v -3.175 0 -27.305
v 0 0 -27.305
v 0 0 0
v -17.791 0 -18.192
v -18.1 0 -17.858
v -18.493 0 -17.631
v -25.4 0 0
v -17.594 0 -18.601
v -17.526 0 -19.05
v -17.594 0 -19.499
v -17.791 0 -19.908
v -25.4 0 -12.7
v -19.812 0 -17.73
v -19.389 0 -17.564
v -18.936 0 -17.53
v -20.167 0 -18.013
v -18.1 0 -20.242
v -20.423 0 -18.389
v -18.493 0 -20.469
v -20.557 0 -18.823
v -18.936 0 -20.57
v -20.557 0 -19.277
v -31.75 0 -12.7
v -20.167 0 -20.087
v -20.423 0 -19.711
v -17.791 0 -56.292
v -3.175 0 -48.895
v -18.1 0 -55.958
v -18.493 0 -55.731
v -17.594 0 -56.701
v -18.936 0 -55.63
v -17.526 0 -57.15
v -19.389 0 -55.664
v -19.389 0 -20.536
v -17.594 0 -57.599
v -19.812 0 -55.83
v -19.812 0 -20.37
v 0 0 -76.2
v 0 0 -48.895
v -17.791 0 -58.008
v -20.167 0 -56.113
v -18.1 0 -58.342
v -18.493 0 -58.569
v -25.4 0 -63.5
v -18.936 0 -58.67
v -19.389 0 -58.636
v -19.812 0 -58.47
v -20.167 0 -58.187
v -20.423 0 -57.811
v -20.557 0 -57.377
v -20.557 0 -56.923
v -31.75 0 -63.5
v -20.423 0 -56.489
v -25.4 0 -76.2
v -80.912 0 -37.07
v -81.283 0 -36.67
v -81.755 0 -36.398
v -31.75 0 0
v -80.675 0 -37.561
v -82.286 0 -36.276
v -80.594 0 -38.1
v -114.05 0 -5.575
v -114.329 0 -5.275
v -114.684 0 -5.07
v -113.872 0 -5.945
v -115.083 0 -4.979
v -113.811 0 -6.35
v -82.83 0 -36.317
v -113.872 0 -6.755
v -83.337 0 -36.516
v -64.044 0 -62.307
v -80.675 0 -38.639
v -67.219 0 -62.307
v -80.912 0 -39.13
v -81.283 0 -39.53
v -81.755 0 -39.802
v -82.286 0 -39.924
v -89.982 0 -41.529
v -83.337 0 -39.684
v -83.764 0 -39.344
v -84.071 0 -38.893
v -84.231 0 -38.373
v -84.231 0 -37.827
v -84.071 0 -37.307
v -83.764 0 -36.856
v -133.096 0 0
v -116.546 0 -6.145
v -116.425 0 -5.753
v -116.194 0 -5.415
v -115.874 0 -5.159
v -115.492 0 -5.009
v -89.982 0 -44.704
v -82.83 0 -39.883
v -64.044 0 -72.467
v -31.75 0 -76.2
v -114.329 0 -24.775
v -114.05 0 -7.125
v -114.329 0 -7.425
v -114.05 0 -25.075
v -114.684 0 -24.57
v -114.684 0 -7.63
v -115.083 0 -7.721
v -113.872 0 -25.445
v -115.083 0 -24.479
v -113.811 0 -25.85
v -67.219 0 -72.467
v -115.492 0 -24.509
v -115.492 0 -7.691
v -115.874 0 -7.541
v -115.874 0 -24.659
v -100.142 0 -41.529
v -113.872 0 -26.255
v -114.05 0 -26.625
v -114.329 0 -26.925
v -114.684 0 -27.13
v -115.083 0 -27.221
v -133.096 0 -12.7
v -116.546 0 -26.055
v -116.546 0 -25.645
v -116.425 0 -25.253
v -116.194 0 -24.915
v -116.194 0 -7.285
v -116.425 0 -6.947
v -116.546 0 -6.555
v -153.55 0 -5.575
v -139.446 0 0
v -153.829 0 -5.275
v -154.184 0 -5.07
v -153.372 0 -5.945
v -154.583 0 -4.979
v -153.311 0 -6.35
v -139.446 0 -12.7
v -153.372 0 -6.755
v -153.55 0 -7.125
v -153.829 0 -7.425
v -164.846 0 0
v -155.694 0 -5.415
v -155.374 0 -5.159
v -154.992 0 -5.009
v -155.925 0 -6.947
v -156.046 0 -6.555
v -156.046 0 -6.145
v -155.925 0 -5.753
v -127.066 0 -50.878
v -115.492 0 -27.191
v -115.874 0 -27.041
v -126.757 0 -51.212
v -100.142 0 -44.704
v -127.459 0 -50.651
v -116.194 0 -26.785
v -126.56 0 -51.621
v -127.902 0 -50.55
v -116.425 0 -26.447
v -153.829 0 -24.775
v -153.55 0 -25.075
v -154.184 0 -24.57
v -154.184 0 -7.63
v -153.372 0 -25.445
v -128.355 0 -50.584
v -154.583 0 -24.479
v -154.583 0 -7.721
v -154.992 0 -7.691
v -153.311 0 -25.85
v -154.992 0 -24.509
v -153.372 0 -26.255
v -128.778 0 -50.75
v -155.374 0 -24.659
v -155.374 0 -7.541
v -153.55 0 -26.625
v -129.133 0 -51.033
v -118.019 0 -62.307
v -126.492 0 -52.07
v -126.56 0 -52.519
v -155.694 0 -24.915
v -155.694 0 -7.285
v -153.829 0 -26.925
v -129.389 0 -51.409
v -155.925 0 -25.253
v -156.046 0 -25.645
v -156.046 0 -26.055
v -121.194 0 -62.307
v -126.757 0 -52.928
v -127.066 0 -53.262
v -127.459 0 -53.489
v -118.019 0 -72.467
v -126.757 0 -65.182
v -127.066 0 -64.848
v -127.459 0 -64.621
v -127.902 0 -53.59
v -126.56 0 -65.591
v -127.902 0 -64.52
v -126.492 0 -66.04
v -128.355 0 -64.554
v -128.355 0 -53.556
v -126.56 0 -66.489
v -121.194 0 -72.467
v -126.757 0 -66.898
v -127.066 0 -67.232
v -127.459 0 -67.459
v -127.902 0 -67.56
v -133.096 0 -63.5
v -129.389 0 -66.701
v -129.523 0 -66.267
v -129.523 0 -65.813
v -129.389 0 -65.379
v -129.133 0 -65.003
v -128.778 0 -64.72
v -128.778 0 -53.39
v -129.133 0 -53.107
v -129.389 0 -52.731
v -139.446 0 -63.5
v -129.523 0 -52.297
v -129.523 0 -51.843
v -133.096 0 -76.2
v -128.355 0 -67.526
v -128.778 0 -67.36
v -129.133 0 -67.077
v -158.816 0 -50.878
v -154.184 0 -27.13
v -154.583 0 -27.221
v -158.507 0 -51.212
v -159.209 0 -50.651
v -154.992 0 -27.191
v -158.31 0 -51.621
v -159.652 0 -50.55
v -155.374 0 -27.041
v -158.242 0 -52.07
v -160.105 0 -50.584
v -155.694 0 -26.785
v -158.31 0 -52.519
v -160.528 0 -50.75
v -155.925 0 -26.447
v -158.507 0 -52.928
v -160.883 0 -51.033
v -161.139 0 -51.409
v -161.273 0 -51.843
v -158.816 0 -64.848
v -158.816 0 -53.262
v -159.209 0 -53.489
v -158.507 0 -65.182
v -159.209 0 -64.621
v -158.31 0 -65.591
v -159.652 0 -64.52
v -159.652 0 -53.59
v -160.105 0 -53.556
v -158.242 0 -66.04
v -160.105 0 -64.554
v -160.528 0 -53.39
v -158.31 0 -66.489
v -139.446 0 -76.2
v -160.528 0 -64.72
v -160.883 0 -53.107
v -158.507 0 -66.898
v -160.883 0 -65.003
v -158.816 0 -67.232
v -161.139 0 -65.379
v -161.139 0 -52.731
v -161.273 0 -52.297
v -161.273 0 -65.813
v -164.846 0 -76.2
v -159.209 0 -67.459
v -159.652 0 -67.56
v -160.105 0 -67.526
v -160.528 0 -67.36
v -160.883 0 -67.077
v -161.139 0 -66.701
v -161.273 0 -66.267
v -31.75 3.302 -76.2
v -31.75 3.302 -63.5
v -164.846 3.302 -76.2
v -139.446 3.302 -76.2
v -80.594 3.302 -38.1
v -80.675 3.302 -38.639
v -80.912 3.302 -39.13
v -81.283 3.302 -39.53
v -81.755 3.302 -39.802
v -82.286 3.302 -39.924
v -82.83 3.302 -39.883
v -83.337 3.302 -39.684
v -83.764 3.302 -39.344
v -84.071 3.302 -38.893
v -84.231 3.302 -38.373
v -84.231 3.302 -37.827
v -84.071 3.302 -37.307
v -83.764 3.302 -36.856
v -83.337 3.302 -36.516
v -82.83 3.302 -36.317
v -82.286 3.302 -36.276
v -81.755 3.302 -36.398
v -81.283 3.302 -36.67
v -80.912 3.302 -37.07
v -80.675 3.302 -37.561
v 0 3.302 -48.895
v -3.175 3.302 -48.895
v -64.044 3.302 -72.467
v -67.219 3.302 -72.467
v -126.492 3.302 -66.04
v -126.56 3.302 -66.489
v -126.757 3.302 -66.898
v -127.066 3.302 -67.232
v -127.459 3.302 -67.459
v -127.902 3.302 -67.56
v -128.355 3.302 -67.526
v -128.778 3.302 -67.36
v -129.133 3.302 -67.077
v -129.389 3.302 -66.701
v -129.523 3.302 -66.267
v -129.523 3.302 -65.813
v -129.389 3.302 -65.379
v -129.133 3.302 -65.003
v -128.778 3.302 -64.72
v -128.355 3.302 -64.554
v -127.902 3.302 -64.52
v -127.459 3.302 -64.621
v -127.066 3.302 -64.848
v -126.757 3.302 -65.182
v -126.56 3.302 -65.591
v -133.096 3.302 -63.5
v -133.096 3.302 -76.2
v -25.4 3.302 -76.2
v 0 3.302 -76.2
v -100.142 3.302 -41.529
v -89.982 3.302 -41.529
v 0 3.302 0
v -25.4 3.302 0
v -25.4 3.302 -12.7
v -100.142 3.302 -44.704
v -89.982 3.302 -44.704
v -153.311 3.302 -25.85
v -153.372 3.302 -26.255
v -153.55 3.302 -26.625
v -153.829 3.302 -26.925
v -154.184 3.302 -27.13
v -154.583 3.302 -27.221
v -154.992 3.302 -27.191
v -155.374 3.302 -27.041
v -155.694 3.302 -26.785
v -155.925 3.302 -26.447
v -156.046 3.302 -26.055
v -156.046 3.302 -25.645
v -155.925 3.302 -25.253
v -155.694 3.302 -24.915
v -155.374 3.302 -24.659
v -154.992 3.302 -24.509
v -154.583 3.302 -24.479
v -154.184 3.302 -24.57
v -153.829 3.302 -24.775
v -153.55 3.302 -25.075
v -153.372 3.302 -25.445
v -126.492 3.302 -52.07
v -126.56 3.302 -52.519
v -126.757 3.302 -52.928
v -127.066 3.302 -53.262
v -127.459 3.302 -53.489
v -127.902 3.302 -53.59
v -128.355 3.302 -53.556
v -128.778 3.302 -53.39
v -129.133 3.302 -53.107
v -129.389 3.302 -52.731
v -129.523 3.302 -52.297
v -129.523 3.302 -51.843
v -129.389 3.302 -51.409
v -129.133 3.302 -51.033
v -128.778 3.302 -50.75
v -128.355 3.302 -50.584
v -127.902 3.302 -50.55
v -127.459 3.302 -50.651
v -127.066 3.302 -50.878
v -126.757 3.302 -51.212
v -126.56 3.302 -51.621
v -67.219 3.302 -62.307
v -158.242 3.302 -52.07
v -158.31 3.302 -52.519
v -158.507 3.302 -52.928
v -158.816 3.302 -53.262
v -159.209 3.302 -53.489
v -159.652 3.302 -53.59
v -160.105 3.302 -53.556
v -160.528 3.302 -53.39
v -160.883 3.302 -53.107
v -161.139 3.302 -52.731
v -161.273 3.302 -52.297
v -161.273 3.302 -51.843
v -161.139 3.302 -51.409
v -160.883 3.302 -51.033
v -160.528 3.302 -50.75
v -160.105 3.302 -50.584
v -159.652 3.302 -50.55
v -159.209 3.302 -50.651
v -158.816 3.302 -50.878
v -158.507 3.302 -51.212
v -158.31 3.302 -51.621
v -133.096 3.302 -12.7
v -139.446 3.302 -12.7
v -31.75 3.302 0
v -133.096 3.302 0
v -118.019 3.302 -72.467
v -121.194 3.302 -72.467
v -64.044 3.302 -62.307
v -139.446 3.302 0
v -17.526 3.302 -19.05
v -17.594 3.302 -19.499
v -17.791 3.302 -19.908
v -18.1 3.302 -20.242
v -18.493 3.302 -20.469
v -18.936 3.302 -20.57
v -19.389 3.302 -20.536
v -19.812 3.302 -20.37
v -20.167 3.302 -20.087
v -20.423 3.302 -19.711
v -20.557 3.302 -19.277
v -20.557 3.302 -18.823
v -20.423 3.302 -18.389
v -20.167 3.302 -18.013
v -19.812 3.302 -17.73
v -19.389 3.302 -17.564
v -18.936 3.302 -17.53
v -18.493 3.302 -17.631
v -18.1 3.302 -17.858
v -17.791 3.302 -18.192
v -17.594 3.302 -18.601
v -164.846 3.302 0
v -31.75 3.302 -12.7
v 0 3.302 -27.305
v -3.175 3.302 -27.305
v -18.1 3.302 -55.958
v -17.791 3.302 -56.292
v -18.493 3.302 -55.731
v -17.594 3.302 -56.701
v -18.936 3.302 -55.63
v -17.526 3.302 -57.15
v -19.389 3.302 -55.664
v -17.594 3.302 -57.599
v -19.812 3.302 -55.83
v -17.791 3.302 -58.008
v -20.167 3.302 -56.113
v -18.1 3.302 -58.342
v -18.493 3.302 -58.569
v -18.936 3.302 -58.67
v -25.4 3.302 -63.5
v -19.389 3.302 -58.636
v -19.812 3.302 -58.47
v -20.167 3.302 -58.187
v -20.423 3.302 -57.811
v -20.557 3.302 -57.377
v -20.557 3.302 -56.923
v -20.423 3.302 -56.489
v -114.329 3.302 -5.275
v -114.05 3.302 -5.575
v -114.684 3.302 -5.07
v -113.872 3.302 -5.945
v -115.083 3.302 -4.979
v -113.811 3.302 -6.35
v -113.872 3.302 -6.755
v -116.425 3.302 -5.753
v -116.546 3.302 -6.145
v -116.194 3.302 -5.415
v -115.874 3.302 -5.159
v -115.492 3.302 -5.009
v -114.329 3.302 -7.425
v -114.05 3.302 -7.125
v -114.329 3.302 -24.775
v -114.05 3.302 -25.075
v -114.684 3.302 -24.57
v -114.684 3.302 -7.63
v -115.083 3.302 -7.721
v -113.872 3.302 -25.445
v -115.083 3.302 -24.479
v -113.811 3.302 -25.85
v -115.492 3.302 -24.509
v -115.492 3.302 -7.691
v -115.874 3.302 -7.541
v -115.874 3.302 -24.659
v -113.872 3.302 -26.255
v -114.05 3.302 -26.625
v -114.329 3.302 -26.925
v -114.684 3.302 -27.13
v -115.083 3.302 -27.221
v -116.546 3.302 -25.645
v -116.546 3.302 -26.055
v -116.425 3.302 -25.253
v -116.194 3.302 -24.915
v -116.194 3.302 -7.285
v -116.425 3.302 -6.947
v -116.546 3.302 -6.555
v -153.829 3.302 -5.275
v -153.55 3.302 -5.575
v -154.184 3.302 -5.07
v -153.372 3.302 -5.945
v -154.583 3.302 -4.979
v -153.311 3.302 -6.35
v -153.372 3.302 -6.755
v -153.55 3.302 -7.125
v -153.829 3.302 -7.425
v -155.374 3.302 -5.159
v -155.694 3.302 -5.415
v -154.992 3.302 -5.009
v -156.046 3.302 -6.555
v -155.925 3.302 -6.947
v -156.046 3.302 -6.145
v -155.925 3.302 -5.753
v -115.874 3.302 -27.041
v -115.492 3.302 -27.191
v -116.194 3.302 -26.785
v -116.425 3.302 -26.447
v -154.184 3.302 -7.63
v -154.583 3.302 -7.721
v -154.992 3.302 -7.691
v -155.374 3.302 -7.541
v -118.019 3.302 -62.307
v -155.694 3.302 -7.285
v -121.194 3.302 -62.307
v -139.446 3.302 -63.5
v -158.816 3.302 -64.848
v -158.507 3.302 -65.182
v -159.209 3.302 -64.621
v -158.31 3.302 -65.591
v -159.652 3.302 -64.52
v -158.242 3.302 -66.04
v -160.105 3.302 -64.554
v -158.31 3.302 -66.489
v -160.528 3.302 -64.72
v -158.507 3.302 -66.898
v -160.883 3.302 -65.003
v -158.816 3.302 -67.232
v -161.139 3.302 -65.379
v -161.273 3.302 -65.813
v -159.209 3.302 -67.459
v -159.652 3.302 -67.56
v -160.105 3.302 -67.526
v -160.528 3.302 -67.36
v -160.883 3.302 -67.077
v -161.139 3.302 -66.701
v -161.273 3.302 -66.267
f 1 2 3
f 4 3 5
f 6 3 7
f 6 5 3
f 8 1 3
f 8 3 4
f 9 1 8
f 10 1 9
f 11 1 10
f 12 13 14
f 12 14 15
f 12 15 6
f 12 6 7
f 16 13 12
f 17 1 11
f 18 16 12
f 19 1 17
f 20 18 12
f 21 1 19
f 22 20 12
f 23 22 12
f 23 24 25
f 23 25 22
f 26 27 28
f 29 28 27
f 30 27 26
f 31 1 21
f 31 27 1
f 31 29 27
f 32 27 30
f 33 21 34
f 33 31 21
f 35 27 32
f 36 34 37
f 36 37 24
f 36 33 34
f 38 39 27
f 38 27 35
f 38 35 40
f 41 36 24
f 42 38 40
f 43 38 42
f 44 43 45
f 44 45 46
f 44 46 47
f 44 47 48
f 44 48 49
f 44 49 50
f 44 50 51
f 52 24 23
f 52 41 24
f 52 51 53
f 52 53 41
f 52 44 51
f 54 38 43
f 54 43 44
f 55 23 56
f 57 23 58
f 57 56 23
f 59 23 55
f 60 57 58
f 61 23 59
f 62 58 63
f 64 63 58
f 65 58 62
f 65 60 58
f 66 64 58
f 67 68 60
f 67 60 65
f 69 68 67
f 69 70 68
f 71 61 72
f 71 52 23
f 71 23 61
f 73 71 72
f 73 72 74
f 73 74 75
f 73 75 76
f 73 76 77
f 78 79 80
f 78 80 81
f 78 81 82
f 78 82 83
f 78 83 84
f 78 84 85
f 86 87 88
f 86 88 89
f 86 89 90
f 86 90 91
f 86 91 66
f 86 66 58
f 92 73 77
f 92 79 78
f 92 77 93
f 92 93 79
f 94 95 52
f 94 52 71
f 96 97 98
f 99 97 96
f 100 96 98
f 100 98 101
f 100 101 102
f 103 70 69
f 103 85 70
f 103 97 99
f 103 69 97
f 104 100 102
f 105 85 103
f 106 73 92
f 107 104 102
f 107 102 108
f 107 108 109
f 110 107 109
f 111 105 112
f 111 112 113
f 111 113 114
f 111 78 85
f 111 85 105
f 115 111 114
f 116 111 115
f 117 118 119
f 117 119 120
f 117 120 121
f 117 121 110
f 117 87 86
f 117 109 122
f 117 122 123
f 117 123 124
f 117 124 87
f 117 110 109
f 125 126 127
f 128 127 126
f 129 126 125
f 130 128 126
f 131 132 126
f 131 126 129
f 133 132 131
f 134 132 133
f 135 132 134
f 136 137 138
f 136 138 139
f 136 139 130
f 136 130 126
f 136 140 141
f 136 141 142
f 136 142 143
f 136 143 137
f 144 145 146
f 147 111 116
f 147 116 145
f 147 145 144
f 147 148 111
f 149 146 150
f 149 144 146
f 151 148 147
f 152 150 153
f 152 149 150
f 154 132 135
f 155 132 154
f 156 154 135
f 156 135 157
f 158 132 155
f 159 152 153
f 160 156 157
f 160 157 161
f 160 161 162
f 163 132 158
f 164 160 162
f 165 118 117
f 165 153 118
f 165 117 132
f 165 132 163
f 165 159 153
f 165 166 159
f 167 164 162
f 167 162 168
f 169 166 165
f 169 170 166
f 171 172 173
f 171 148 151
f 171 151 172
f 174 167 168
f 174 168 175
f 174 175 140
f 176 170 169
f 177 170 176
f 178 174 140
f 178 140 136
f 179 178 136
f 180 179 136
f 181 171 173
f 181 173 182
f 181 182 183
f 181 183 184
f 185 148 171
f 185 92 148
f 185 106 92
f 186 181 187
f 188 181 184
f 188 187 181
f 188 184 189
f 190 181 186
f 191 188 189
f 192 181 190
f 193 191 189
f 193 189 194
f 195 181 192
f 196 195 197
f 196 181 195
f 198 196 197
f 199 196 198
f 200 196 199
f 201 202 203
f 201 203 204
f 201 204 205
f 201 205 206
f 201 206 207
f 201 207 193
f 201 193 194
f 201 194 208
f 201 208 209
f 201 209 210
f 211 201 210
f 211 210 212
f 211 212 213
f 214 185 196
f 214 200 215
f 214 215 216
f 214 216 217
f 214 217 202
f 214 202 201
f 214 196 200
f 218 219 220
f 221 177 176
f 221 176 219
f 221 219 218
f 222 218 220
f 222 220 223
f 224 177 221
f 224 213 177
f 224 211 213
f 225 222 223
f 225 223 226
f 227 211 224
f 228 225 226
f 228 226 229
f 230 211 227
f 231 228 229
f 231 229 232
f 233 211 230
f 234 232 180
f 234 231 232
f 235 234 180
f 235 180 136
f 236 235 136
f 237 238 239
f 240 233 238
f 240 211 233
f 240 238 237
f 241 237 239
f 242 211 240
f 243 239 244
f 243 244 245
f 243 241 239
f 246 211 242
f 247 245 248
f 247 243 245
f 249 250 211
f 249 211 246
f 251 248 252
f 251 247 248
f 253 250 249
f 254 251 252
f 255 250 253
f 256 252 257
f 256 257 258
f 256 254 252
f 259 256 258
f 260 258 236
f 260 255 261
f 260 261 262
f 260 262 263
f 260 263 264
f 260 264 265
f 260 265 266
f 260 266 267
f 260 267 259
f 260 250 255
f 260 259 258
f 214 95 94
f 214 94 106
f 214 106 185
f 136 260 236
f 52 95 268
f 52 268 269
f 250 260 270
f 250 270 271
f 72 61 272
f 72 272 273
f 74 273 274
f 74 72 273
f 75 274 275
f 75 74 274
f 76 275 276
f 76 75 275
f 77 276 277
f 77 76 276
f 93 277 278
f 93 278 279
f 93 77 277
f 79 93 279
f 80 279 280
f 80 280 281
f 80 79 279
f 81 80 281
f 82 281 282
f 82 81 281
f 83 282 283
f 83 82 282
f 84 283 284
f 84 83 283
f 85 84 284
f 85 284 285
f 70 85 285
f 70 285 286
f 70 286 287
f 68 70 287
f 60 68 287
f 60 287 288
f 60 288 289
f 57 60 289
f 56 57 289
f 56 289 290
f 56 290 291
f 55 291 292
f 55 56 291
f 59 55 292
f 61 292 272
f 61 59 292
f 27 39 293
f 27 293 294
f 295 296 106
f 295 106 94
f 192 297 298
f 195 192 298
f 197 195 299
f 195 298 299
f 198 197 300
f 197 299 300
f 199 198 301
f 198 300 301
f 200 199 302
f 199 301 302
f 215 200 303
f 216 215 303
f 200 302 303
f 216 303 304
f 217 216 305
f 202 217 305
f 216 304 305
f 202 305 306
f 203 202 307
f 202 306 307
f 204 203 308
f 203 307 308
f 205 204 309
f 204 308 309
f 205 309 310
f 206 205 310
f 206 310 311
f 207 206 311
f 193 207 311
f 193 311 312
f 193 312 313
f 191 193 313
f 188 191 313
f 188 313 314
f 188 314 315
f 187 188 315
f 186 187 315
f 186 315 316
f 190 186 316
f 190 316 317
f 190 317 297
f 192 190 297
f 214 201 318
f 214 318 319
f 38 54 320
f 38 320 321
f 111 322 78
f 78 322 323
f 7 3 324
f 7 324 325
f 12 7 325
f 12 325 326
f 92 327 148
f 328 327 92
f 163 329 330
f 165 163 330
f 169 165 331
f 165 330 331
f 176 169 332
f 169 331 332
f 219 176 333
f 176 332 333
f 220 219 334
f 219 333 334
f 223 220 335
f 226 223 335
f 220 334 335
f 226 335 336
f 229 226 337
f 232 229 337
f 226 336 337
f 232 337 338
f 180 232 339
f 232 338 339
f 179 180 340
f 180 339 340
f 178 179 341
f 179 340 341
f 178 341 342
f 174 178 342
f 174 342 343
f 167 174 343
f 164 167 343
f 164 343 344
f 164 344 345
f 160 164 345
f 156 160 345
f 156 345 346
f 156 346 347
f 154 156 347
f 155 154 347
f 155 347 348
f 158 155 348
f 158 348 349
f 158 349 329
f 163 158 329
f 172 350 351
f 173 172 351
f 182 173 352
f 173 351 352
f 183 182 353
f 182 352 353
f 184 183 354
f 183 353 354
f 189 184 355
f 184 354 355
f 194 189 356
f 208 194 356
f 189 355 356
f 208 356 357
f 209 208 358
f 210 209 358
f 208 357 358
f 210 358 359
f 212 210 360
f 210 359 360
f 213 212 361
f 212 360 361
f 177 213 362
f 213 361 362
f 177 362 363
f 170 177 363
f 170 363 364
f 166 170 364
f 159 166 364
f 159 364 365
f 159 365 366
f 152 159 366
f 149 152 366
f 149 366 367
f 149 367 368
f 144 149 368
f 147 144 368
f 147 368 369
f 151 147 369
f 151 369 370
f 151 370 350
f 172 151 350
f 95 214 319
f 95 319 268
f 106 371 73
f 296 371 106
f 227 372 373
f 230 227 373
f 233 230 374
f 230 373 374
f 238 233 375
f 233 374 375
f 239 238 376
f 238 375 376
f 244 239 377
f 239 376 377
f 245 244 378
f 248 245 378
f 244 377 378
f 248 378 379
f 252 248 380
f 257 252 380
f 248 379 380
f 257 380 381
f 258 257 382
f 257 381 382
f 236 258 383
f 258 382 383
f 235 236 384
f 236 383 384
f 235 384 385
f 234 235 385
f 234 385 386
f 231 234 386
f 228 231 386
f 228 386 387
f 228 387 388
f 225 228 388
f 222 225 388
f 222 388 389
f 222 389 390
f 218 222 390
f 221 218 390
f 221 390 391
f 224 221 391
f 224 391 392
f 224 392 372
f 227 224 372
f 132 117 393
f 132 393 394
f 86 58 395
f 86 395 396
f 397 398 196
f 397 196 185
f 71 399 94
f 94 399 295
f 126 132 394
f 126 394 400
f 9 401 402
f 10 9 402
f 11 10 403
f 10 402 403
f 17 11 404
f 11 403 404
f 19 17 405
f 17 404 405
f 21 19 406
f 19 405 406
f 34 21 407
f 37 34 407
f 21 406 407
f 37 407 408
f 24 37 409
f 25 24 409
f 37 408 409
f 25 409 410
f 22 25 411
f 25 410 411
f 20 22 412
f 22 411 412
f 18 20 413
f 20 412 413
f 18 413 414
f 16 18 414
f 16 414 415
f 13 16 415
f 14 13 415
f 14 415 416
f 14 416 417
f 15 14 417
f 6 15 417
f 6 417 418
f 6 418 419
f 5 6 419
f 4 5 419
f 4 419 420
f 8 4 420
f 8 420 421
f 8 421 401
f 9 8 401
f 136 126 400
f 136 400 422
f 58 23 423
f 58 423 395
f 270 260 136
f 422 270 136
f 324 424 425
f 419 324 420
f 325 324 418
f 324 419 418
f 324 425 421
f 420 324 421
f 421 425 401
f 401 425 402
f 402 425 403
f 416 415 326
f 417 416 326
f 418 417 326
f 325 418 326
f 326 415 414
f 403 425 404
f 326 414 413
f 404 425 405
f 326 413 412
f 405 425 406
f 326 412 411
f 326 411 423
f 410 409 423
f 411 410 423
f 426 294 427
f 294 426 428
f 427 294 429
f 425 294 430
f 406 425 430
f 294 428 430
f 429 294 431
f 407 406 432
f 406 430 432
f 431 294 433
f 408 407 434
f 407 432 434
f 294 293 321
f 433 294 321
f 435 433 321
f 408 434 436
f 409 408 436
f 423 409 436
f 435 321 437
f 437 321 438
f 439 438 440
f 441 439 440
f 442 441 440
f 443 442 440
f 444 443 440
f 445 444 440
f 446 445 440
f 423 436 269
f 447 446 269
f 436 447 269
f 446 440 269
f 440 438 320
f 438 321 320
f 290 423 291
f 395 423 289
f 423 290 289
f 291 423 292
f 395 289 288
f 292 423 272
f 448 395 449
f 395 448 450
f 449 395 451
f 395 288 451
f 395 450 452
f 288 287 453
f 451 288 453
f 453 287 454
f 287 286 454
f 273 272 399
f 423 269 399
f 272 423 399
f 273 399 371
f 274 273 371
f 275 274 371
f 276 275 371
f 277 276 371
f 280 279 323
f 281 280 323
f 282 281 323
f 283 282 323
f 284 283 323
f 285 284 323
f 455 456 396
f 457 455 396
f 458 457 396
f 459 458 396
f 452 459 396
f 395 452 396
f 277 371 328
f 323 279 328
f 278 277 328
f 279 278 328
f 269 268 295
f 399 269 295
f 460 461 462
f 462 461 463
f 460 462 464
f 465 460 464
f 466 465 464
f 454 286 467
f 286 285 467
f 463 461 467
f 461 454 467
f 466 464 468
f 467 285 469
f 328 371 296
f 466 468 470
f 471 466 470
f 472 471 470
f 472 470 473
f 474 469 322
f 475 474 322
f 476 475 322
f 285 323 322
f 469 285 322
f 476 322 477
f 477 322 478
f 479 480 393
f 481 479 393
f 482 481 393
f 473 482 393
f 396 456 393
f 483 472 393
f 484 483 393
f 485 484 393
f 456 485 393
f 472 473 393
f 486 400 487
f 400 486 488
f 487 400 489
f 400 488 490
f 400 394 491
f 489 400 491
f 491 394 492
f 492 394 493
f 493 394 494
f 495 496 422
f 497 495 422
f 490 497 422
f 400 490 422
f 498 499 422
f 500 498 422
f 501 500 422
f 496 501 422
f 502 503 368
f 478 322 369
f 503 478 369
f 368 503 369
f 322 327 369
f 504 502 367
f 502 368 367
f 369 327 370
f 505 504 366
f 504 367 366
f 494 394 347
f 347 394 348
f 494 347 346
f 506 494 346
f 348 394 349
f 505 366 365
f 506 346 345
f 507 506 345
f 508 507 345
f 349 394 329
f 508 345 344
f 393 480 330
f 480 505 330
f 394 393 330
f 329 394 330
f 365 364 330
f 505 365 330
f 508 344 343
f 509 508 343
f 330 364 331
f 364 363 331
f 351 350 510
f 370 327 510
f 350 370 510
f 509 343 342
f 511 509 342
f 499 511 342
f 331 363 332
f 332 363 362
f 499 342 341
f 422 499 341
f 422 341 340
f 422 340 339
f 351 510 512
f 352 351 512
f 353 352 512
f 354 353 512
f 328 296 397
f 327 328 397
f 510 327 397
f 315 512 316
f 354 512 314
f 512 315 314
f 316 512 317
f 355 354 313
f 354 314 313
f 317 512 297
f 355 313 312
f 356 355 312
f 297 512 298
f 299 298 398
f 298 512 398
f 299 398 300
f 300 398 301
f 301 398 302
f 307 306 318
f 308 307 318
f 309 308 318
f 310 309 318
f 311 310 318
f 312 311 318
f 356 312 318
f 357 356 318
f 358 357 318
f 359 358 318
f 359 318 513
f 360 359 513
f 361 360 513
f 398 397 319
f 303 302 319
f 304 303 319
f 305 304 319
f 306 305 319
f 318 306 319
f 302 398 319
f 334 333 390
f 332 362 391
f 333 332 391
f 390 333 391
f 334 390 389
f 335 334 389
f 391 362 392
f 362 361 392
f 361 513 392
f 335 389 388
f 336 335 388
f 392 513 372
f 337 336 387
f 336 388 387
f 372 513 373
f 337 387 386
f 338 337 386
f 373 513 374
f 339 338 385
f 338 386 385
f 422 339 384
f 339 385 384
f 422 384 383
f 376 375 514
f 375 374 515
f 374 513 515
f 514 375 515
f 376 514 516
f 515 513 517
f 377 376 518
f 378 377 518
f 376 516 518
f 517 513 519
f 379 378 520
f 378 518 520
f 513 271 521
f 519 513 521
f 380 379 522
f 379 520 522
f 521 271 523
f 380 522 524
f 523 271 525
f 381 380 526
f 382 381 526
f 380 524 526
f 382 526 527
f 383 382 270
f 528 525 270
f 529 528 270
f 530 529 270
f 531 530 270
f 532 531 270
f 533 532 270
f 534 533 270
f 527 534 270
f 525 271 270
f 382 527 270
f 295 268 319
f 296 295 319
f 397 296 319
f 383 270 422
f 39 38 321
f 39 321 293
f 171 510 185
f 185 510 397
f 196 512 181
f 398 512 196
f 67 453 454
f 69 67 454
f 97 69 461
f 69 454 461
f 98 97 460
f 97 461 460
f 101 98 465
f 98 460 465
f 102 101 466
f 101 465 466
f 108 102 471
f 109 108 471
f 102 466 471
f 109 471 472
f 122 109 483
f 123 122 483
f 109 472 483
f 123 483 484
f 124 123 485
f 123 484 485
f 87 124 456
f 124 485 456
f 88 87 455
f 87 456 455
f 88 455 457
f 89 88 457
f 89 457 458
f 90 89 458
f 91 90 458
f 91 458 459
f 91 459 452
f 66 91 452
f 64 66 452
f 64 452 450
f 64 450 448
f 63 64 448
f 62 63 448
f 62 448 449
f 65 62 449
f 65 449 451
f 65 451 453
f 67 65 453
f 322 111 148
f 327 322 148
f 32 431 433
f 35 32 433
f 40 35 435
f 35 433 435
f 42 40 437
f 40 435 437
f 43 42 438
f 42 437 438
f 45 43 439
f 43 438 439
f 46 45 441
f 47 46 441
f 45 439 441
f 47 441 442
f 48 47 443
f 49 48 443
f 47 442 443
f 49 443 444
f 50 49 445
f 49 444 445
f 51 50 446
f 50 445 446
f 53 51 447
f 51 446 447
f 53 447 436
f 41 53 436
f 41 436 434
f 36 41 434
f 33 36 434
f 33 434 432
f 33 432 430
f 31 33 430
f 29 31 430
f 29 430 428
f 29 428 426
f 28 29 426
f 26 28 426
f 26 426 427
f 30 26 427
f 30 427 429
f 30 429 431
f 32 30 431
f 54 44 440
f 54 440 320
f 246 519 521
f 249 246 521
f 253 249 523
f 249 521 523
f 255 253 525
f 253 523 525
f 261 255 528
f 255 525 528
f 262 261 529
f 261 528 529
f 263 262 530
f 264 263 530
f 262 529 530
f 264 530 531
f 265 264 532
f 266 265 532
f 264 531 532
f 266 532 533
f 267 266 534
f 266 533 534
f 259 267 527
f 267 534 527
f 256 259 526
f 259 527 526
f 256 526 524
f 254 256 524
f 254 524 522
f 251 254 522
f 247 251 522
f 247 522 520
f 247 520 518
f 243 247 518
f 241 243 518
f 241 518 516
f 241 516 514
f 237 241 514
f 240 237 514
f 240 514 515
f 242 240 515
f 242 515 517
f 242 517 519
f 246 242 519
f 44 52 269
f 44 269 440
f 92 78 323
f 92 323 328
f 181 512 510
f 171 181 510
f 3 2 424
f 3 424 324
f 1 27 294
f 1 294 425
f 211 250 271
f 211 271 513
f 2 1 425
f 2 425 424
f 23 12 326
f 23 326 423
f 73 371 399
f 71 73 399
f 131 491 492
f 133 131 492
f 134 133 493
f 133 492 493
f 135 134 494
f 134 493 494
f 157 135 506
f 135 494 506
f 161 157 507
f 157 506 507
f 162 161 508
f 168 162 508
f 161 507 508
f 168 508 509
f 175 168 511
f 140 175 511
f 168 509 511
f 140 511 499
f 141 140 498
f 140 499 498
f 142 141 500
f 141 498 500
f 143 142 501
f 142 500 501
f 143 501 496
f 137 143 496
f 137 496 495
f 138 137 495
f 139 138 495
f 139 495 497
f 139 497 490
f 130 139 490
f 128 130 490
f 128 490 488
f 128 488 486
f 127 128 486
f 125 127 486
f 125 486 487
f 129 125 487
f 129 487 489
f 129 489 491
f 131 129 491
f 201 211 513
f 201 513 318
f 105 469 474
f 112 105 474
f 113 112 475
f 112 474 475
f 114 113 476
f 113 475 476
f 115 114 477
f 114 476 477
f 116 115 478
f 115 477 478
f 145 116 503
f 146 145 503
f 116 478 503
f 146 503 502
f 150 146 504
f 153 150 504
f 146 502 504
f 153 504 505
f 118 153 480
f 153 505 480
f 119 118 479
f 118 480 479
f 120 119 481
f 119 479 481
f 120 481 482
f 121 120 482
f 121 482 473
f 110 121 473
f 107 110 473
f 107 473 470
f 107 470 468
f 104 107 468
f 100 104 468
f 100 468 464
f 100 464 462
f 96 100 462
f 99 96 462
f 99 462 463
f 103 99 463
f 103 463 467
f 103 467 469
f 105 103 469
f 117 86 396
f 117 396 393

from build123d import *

# Parameters (mm, degrees)
SKETCH1_R           = 1.8288
BOSS_EXTRUDE1_DEPTH = 3.302
SKETCH2_R           = 1.524
CUT_EXTRUDE1_DEPTH  = 4.302
SKETCH3_R           = 1.375
CUT_EXTRUDE2_DEPTH  = 4.302
SKETCH4_W           = 3.175
SKETCH4_H           = 10.16
SKETCH4_W_2         = 10.16
SKETCH4_H_2         = 3.175
CUT_EXTRUDE3_DEPTH  = 4.302
SKETCH5_R           = 1.524
CUT_EXTRUDE4_DEPTH  = 4.302


with BuildPart() as part:
    # Sketch1 → Boss-Extrude1 (new body)
    with BuildSketch(Plane(origin=(0, 0, 0), x_dir=(1, 0, 0), z_dir=(0, 1, 0))):
        Polygon((-164.846, 76.2), (-139.446, 76.2), (-139.446, 63.5), (-133.096, 63.5), (-133.096, 76.2), (-31.75, 76.2), (-31.75, 63.5), (-25.4, 63.5), (-25.4, 76.2), (0, 76.2), (0, 48.895), (-3.175, 48.895), (-3.175, 27.305), (0, 27.305), (0, 0), (-25.4, 0), (-25.4, 12.7), (-31.75, 12.7), (-31.75, 0), (-133.096, 0), (-133.096, 12.7), (-139.446, 12.7), (-139.446, 0), (-164.846, 0), (-164.846, 27.305), (-164.846, 48.895), align=None)
        with Locations((-82.423, 38.1)):
            Circle(SKETCH1_R, mode=Mode.SUBTRACT)
    extrude(amount=BOSS_EXTRUDE1_DEPTH)

    # Sketch2 → Cut-Extrude1 (cut, through all)
    with BuildSketch(Plane(origin=(0, 3.302, 0), x_dir=(1, 0, 0), z_dir=(0, 1, 0))):
        with Locations((-159.766, 66.04)):
            Circle(SKETCH2_R)
        with Locations((-128.016, 66.04)):
            Circle(SKETCH2_R)
        with Locations((-128.016, 52.07)):
            Circle(SKETCH2_R)
        with Locations((-159.766, 52.07)):
            Circle(SKETCH2_R)
    extrude(amount=-CUT_EXTRUDE1_DEPTH, mode=Mode.SUBTRACT)

    # Sketch3 → Cut-Extrude2 (cut, through all)
    with BuildSketch(Plane(origin=(0, 3.302, 0), x_dir=(1, 0, 0), z_dir=(0, 1, 0))):
        with Locations((-154.686, 6.35)):
            Circle(SKETCH3_R)
        with Locations((-115.186, 6.35)):
            Circle(SKETCH3_R)
        with Locations((-115.186, 25.85)):
            Circle(SKETCH3_R)
        with Locations((-154.686, 25.85)):
            Circle(SKETCH3_R)
    extrude(amount=-CUT_EXTRUDE2_DEPTH, mode=Mode.SUBTRACT)

    # Sketch4 → Cut-Extrude3 (cut, through all)
    with BuildSketch(Plane(origin=(0, 3.302, 0), x_dir=(1, 0, 0), z_dir=(0, 1, 0))):
        with Locations((-65.63129104, 67.386847386)):
            Rectangle(SKETCH4_W, SKETCH4_H)
        with Locations((-95.06194853, 43.1165)):
            Rectangle(SKETCH4_W_2, SKETCH4_H_2)
        with Locations((-119.60629104, 67.386847386)):
            Rectangle(SKETCH4_W, SKETCH4_H)
    extrude(amount=-CUT_EXTRUDE3_DEPTH, mode=Mode.SUBTRACT)

    # Sketch5 → Cut-Extrude4 (cut, through all)
    with BuildSketch(Plane(origin=(0, 3.302, 0), x_dir=(1, 0, 0), z_dir=(0, 1, 0))):
        with Locations((-19.05, 19.05)):
            Circle(SKETCH5_R)
        with Locations((-19.05, 57.15)):
            Circle(SKETCH5_R)
    extrude(amount=-CUT_EXTRUDE4_DEPTH, mode=Mode.SUBTRACT)


solid = part.part
